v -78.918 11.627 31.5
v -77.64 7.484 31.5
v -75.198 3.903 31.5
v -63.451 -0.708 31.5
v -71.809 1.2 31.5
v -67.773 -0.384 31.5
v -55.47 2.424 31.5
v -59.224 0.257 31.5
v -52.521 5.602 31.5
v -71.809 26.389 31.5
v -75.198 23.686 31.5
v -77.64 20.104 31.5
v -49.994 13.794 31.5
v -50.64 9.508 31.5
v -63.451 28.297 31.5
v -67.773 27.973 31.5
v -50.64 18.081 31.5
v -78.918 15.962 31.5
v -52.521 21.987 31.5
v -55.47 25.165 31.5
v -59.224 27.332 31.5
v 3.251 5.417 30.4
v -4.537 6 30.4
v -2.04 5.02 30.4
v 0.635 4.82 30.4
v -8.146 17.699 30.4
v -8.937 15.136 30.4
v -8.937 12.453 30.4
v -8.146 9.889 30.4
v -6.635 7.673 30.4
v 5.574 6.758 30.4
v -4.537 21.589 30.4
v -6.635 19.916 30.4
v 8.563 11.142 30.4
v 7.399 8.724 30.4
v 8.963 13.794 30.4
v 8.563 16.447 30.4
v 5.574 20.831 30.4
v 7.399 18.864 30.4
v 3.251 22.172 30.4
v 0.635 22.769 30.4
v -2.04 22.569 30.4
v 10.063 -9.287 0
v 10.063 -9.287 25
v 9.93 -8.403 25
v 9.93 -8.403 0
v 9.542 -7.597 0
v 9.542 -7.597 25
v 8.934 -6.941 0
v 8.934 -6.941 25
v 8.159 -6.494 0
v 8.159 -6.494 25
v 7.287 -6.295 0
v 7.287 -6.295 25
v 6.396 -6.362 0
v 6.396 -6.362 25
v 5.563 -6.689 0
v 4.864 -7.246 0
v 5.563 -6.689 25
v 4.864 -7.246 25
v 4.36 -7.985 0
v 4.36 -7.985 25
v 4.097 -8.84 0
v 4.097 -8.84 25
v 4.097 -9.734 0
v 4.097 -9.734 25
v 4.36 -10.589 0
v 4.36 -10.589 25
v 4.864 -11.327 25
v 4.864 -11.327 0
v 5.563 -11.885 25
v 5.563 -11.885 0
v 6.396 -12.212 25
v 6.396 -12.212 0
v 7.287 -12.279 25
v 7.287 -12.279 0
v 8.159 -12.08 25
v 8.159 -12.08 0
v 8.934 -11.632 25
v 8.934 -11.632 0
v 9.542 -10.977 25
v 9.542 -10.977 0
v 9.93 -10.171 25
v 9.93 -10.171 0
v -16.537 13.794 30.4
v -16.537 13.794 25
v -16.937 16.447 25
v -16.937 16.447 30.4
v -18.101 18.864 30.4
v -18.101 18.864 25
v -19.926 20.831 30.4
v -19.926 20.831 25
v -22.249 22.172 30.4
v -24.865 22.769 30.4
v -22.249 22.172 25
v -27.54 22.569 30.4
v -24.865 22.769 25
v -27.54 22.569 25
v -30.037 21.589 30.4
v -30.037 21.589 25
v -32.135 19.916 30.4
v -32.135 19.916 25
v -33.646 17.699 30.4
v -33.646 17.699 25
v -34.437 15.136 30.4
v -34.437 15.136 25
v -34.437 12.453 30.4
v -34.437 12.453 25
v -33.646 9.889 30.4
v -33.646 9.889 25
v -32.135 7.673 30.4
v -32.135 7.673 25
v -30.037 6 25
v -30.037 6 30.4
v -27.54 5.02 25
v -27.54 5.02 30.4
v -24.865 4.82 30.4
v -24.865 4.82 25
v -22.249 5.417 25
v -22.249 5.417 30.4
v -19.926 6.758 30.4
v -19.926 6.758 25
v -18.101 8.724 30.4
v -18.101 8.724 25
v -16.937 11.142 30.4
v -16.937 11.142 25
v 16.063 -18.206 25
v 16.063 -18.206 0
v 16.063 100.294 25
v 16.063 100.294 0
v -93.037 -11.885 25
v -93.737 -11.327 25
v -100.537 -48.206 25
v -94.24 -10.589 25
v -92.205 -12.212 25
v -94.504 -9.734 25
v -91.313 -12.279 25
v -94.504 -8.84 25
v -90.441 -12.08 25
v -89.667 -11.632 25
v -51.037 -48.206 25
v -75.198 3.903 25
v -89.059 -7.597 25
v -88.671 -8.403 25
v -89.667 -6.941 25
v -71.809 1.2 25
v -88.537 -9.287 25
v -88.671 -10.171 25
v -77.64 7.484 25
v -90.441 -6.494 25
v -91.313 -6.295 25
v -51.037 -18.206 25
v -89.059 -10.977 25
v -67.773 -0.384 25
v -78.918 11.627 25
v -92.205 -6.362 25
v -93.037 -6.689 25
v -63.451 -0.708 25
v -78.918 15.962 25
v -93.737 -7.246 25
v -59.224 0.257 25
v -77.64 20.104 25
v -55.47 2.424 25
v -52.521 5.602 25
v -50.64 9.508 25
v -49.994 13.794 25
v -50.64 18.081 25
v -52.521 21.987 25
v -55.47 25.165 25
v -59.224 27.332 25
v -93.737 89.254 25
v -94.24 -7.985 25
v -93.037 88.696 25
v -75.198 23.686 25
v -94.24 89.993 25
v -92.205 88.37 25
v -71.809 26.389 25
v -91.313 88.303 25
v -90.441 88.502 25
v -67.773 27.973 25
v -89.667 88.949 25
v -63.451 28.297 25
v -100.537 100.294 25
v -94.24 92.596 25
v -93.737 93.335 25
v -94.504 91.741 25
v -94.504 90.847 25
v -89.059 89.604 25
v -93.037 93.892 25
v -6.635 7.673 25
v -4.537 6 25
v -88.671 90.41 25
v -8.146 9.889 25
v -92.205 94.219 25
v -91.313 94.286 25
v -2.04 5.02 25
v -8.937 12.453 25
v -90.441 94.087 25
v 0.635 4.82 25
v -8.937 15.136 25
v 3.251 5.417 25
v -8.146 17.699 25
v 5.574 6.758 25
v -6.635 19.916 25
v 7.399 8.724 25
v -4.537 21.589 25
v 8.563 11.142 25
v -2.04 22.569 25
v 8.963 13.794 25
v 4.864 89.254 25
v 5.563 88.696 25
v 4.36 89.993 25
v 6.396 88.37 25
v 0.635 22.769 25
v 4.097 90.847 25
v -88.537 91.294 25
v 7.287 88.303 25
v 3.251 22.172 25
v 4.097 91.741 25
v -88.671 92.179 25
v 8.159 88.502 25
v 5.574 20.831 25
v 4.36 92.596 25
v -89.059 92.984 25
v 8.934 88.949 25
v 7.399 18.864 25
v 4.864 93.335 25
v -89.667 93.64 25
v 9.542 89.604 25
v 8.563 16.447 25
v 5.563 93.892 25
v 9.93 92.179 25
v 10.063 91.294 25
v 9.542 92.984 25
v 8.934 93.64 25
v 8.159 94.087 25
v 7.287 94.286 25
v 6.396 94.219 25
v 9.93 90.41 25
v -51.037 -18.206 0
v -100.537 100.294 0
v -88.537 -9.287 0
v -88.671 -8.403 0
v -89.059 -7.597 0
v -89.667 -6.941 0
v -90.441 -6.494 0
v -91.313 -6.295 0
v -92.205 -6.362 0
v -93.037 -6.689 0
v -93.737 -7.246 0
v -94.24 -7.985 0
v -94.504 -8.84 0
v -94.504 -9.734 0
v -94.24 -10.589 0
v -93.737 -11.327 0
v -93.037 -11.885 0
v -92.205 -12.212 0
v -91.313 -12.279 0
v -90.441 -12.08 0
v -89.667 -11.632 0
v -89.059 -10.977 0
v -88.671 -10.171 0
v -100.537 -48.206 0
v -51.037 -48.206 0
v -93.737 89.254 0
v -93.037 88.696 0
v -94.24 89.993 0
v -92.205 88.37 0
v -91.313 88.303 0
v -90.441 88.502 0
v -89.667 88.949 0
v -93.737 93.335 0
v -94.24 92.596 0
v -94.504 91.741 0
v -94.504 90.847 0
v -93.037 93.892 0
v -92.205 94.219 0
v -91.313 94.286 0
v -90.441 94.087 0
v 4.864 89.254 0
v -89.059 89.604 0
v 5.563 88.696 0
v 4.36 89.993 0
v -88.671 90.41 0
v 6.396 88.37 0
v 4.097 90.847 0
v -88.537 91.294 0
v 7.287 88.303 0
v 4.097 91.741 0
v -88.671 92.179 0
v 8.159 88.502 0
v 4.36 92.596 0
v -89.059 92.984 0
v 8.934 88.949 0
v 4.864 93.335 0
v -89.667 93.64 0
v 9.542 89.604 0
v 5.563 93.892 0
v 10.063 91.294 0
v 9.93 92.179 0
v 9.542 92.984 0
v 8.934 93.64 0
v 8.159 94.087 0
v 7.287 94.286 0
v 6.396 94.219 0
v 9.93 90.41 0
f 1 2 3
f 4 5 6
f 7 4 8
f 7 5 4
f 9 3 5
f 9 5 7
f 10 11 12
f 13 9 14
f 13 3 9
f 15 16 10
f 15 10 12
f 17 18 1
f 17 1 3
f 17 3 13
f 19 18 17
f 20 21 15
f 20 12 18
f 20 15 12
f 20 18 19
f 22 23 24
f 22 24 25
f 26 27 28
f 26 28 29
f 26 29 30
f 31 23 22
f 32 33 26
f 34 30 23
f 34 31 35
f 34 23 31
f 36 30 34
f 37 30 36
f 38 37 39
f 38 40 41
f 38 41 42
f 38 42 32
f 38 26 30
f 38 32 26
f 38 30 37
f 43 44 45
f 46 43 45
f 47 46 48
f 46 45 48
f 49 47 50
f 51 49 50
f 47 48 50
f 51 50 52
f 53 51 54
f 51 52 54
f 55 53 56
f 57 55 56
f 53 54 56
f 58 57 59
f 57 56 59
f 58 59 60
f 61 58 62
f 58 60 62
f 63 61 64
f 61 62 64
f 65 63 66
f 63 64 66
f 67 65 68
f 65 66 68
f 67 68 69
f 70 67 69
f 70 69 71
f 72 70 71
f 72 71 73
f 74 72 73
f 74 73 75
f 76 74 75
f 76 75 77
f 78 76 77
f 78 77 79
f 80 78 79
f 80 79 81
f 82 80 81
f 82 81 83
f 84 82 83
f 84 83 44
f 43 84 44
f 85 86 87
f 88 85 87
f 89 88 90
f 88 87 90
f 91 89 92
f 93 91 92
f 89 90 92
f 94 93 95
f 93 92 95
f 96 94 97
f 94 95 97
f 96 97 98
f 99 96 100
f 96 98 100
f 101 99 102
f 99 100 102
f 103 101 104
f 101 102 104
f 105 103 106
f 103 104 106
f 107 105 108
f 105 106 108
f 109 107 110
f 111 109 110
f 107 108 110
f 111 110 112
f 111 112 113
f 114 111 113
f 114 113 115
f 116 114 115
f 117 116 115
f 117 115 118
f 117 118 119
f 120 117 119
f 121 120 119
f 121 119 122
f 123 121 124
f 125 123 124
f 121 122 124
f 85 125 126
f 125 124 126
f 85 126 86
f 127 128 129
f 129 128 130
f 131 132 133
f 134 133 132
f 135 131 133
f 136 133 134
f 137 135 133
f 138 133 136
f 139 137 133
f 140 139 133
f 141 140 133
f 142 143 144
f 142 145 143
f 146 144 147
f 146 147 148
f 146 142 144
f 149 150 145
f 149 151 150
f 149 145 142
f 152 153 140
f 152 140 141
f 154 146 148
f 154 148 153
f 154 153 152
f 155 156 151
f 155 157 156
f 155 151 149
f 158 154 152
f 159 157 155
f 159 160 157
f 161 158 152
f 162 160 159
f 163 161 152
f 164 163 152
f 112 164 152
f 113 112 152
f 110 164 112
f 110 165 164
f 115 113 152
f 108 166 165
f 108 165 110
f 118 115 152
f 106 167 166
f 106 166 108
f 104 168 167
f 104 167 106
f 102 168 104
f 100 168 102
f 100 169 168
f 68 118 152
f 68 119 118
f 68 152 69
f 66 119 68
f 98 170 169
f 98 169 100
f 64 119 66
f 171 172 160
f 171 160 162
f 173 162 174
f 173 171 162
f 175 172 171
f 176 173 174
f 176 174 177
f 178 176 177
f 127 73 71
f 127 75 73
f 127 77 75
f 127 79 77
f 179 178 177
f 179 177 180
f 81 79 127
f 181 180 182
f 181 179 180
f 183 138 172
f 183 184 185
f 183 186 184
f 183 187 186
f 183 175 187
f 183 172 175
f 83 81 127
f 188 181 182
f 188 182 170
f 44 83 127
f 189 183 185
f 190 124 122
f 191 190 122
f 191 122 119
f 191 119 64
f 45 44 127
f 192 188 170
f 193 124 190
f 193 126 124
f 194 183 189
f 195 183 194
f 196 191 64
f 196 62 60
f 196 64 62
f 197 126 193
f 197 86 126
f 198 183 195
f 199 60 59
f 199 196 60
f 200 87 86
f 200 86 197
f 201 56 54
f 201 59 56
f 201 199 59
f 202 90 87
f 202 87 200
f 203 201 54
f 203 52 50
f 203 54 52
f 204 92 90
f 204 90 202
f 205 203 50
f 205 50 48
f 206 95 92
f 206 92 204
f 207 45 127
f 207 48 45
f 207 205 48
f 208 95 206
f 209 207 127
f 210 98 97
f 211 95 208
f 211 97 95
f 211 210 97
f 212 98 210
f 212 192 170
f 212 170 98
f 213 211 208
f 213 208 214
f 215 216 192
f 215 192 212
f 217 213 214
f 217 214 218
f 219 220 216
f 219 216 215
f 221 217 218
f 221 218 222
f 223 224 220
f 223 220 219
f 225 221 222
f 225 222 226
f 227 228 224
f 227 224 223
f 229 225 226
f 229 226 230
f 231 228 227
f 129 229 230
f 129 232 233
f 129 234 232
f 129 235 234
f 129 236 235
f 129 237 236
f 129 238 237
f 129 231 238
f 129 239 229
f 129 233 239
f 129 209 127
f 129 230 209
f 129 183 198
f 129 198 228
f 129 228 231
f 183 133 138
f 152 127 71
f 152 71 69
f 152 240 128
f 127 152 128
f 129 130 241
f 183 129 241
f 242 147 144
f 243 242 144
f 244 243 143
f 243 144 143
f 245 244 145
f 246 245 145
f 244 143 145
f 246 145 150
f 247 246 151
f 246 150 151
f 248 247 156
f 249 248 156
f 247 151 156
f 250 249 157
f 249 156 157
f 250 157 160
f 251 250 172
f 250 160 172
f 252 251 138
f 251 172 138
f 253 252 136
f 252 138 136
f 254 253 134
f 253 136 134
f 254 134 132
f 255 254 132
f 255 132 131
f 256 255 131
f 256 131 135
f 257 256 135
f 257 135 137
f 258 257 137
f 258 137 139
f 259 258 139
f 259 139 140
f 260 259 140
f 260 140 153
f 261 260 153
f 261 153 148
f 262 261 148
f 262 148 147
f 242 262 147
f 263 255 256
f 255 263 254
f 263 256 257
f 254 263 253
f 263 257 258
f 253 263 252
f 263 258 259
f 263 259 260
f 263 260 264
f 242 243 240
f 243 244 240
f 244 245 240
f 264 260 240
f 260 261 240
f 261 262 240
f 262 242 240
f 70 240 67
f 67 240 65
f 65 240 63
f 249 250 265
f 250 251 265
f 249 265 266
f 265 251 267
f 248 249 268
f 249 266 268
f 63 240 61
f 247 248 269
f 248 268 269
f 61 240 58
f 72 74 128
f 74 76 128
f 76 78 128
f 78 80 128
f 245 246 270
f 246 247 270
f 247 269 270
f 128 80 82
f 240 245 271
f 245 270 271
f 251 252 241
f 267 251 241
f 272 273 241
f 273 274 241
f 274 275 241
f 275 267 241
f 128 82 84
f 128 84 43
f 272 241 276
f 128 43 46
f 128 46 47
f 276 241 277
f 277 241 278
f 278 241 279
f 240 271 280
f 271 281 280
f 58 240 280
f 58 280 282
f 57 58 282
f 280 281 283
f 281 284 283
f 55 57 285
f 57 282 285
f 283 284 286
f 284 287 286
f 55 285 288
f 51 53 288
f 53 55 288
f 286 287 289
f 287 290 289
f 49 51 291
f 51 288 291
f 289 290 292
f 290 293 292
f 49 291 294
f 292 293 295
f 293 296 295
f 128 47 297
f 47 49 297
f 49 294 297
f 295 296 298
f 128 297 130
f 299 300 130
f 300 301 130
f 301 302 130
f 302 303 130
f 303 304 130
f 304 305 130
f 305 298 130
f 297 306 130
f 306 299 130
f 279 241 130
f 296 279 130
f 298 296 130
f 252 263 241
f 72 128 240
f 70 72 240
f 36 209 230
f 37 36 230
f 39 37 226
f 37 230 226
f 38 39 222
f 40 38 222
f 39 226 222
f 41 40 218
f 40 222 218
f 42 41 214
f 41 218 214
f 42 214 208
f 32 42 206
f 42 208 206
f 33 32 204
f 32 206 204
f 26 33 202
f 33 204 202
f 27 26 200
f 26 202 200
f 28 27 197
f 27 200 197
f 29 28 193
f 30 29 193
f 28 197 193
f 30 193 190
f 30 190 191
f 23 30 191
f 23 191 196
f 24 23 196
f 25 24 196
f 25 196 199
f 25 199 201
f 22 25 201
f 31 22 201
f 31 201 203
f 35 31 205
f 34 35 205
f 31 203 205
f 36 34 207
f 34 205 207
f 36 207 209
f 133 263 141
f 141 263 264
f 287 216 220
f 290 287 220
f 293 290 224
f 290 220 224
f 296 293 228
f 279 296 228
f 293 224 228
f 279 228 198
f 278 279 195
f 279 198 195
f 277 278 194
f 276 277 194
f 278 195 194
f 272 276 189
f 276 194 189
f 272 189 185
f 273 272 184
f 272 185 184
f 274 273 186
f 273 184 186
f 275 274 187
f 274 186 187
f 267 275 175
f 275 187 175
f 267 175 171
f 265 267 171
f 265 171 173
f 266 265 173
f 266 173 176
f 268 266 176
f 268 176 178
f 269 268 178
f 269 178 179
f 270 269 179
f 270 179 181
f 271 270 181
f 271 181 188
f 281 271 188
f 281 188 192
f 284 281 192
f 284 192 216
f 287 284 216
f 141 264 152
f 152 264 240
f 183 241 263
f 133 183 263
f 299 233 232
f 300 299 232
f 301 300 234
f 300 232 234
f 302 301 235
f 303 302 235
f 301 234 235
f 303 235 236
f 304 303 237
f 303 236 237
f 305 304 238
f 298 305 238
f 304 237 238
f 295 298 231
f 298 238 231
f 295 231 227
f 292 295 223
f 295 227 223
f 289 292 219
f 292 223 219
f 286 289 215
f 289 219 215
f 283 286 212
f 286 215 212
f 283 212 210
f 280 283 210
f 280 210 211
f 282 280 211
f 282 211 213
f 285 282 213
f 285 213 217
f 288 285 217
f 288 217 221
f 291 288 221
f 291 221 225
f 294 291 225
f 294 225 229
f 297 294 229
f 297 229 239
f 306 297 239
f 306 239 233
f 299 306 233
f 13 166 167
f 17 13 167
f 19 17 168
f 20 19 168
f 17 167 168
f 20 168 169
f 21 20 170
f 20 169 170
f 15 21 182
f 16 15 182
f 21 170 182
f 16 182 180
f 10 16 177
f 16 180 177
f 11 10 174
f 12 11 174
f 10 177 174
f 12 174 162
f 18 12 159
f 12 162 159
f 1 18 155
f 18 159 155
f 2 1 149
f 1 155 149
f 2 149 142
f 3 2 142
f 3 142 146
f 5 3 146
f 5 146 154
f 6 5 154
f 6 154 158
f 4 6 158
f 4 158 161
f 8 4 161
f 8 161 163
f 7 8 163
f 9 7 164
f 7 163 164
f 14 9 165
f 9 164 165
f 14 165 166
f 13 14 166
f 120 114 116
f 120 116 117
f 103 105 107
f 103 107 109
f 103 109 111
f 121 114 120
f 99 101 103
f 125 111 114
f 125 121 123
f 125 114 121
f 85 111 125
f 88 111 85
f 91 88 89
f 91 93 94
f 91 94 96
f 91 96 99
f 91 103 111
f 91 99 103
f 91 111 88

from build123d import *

# Parameters (mm, degrees)
F1_DEPTH = 25
F2_R     = 3
F3_DEPTH = 1000
F4_R     = 14.543021
F5_DEPTH = 6.5
F6_R     = 9
F7_DEPTH = 5.4


with BuildPart() as f1:
    # F0 (on Top) → F1 (new body)
    with BuildSketch(Plane.XY):
        Polygon((16.063117, -18.205635), (16.063117, 100.294365), (-100.53736, 100.294365), (-100.53736, -48.205635), (-51.03736, -48.205635), (-51.03736, -18.205635), align=None)
    extrude(amount=F1_DEPTH)

    # F2 (on face) → F3 (cut)
    with BuildSketch(Plane.XY.offset(25)):
        with Locations((7.063117, 91.294365)):
            Circle(F2_R)
        with Locations((7.063117, -9.286914)):
            Circle(F2_R)
        with Locations((-91.53736, 91.294365)):
            Circle(F2_R)
        with Locations((-91.53736, -9.286914)):
            Circle(F2_R)
    extrude(amount=-F3_DEPTH, mode=Mode.SUBTRACT)

    # F4 (on face) → F5 (join)
    with BuildSketch(Plane.XY.offset(25)):
        with Locations((-64.53736, 13.794365)):
            Circle(F4_R)
    extrude(amount=F5_DEPTH)

    # F6 (on face) → F7 (join)
    with BuildSketch(Plane.XY.offset(25)):
        with Locations((-0.03736, 13.794365)):
            Circle(F6_R)
        with Locations((-25.53736, 13.794365)):
            Circle(F6_R)
    extrude(amount=F7_DEPTH)


solid = f1.part
